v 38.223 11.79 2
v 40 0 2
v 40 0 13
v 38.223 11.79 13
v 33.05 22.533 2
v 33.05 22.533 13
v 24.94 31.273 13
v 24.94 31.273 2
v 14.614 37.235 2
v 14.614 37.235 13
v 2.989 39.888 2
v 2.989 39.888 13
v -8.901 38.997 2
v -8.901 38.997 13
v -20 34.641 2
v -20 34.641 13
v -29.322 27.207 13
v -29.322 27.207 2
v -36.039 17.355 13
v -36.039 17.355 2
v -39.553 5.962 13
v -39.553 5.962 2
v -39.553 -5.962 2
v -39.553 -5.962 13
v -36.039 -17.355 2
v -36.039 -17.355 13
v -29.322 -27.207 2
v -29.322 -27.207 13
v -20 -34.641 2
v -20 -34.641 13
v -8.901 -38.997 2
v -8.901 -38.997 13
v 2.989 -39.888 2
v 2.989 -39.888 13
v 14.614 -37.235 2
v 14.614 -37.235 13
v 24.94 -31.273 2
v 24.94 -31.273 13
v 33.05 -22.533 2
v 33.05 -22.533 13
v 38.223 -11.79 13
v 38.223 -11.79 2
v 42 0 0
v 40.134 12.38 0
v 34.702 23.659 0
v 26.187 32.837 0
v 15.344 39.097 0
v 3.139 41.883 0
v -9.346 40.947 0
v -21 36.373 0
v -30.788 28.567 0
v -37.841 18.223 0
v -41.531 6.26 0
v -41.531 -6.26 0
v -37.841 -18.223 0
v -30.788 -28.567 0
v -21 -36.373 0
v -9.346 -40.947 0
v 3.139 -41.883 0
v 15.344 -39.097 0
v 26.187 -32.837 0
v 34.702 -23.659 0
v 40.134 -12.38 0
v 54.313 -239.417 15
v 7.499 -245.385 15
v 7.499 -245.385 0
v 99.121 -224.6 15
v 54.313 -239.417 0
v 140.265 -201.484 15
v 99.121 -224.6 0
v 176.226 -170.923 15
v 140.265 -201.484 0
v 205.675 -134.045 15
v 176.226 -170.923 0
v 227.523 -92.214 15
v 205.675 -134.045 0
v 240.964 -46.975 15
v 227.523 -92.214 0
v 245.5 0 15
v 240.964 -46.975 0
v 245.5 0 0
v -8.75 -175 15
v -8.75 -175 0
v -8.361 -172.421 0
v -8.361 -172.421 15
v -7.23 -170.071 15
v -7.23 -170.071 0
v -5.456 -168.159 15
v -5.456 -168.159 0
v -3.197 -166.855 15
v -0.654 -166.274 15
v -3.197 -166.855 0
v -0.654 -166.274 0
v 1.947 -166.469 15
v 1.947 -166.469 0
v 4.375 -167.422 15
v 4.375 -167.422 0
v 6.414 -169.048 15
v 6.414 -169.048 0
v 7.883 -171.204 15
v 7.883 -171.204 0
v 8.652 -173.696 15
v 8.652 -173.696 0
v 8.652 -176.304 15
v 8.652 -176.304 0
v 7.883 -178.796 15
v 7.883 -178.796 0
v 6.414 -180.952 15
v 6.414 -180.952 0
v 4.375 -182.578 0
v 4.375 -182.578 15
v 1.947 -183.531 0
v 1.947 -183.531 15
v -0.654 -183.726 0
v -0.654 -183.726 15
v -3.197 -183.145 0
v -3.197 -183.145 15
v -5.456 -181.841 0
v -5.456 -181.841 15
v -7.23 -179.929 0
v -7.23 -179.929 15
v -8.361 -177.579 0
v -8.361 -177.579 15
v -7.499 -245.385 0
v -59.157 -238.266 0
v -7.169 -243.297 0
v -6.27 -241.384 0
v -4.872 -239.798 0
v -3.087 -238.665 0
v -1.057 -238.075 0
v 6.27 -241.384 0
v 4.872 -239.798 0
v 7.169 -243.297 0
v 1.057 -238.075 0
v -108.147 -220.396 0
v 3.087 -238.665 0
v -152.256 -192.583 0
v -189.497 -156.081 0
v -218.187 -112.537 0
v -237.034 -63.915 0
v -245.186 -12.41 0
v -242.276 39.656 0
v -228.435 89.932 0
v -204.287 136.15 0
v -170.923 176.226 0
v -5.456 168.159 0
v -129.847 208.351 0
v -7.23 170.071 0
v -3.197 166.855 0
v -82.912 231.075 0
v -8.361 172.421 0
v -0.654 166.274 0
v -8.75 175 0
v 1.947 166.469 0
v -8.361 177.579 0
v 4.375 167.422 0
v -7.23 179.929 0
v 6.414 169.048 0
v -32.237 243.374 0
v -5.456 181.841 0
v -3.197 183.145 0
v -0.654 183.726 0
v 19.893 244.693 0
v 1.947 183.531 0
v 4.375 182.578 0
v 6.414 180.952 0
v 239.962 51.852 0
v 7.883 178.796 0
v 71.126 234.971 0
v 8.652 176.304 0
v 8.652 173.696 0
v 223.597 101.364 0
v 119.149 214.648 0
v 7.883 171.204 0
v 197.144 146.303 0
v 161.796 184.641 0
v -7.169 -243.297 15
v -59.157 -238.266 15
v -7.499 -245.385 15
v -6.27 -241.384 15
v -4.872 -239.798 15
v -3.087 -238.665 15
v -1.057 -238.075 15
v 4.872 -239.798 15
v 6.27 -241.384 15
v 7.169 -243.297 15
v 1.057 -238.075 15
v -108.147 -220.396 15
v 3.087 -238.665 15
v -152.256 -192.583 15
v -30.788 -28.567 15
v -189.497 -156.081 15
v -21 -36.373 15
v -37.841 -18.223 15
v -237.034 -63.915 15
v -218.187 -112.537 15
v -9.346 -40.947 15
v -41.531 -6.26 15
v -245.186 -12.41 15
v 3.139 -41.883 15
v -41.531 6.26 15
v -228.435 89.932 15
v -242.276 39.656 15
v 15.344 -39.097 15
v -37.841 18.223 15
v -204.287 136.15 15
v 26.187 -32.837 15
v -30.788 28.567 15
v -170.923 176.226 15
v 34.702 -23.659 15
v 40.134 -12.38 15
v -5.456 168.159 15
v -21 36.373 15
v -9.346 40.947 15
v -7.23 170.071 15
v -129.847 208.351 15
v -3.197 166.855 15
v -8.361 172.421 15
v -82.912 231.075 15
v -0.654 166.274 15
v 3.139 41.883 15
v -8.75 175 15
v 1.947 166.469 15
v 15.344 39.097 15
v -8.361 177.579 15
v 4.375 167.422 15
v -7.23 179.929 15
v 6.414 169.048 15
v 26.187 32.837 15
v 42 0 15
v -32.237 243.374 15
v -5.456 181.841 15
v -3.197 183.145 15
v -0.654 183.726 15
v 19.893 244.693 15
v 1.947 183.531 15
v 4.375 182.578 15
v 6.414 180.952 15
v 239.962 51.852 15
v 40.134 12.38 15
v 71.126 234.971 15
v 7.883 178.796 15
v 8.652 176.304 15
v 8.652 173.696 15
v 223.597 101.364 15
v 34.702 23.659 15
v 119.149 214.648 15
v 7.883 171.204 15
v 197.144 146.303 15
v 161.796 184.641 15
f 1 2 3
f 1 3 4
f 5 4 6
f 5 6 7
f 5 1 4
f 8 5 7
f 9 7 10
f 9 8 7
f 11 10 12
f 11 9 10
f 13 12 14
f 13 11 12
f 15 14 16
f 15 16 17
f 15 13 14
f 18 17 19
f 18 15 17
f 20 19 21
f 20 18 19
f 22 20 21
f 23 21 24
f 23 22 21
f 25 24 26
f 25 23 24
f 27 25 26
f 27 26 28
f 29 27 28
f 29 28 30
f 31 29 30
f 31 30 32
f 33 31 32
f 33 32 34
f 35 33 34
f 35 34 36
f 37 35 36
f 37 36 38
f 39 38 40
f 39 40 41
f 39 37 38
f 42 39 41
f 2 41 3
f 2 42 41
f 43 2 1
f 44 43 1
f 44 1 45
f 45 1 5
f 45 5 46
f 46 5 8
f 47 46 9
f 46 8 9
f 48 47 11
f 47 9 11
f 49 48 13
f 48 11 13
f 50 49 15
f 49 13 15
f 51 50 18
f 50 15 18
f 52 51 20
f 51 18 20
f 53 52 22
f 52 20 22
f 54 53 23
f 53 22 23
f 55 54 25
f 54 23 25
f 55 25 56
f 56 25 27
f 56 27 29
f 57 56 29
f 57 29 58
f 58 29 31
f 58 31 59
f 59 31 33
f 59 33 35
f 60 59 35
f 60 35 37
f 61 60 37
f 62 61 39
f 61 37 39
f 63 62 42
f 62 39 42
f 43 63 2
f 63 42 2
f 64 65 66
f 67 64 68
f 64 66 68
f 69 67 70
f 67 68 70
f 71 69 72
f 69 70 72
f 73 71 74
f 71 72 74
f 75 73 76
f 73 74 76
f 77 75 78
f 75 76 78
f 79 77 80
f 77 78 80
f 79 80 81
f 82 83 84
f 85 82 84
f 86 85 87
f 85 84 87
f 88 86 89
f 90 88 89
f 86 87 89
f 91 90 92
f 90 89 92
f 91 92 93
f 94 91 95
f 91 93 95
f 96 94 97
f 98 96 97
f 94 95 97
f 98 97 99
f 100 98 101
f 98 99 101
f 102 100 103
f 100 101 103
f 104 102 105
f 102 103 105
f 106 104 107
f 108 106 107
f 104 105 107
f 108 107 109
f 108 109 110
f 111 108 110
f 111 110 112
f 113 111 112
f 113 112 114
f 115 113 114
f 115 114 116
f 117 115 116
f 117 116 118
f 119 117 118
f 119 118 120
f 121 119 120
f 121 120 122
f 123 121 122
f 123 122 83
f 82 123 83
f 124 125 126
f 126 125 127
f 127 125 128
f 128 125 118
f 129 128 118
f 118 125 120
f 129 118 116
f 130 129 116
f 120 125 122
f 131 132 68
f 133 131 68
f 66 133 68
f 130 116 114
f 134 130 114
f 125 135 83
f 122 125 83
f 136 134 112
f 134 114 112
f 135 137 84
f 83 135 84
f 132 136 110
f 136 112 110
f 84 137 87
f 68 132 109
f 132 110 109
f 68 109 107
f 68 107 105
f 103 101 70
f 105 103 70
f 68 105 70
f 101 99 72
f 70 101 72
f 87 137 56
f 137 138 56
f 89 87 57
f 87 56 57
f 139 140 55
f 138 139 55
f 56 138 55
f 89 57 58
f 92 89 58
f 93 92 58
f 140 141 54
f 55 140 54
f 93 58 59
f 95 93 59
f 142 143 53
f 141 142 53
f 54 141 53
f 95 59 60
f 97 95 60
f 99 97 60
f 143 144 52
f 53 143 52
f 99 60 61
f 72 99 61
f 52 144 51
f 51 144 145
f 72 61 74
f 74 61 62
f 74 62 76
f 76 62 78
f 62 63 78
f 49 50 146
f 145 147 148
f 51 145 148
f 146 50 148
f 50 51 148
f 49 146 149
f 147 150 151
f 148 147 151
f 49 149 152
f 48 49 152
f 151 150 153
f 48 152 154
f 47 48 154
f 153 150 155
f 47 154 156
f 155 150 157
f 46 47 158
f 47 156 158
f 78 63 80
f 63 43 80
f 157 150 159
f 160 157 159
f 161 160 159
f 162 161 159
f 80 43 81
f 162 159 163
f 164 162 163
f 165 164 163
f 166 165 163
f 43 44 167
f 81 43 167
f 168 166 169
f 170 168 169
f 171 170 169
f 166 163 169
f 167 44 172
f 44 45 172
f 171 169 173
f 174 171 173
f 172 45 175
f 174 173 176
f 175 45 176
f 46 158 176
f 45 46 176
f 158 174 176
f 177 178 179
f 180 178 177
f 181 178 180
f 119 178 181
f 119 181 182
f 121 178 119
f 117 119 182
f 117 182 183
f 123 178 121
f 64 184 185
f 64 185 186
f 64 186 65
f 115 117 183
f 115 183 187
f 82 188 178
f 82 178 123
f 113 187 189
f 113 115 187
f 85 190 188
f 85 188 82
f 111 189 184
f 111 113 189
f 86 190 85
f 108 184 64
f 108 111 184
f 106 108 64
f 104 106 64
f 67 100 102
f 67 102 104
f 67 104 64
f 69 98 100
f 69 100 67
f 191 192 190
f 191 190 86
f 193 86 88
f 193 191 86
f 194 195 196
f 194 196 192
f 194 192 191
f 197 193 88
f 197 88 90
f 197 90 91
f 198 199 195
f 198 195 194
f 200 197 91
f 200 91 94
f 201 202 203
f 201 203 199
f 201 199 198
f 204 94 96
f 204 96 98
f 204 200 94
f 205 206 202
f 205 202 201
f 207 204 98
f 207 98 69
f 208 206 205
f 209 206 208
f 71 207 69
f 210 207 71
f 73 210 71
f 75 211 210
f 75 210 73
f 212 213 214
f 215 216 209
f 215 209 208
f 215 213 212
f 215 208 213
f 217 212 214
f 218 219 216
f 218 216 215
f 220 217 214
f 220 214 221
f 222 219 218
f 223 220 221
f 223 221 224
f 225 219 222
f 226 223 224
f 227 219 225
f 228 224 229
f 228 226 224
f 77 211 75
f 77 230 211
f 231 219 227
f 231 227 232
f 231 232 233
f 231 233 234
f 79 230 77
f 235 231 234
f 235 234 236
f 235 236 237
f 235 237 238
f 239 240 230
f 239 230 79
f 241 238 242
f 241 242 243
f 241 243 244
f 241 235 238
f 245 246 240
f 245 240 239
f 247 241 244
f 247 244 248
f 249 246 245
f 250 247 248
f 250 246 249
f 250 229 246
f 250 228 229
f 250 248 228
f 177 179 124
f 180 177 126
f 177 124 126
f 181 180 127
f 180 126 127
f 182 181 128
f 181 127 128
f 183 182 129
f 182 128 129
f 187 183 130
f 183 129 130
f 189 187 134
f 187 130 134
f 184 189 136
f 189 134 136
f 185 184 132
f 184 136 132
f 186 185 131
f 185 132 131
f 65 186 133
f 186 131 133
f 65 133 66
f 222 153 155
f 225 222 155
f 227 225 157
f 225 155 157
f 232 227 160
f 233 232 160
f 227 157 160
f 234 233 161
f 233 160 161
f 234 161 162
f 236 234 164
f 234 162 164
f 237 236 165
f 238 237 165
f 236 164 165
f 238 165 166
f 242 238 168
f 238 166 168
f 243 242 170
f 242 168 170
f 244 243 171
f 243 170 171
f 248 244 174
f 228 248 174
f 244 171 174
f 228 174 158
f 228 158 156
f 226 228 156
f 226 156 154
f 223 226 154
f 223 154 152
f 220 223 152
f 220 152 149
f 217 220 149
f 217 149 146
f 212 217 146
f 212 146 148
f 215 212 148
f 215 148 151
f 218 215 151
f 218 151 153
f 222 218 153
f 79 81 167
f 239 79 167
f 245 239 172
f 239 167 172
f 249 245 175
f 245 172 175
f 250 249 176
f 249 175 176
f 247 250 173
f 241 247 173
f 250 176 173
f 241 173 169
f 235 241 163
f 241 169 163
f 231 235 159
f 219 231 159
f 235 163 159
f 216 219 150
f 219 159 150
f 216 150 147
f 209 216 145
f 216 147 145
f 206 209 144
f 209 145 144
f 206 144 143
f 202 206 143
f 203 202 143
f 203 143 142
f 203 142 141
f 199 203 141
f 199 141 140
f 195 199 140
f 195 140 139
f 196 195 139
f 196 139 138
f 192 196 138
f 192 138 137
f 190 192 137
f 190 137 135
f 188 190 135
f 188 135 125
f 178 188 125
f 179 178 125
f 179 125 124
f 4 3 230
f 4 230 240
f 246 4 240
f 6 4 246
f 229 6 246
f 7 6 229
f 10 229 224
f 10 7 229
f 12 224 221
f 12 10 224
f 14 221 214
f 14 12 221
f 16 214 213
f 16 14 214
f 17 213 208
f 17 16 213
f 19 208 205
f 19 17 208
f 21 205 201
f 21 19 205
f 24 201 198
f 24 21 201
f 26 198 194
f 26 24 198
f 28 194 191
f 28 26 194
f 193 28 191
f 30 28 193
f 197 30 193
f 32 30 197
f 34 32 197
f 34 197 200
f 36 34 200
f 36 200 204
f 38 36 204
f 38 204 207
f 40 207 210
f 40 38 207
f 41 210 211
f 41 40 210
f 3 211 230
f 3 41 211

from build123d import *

# Parameters (mm, degrees)
ESQUISSE1_R             = 245.5
ESQUISSE1_R_2           = 40
BOSS_EXTRU_1_DEPTH      = 15
D_GAGEMENT_M20_D        = 17.5
D_GAGEMENT_M20_DEPTH    = 15
CHANFREIN1_SIZE         = 2
ENL_V_MAT_EXTRU_1_REACH = 17
ESQUISSE4_R             = 7.5


with BuildPart() as part:
    # Esquisse1 → Boss.-Extru.1 (new body)
    with BuildSketch(Plane.XY):
        Circle(ESQUISSE1_R)
        Circle(ESQUISSE1_R_2, mode=Mode.SUBTRACT)
    extrude(amount=BOSS_EXTRU_1_DEPTH)

    # Dégagement M20
    with Locations(Plane.XY.offset(15)):
        with Locations((0, 175), (0, -175)):
            Hole(D_GAGEMENT_M20_D / 2, depth=D_GAGEMENT_M20_DEPTH)

    # Chanfrein1
    chanfrein1_edges = [part.edges().sort_by_distance(p)[0] for p in [
        (-40, 0, 0),
        (-40, 0, 15),
    ]]
    chamfer(chanfrein1_edges, length=CHANFREIN1_SIZE)

    # Esquisse4 → Enlèv. mat.-Extru.1 (cut, up to next)
    with BuildSketch(Plane(origin=(0, 0, 0), x_dir=(-1, 0, 0), z_dir=(0, 0, -1)), mode=Mode.PRIVATE) as enl_v_mat_extru_1_sk1:
        with Locations((0, -245.5)):
            Circle(ESQUISSE4_R)
    enl_v_mat_extru_1_tool1 = extrude(enl_v_mat_extru_1_sk1.sketch, amount=-ENL_V_MAT_EXTRU_1_REACH, mode=Mode.PRIVATE) & part.part
    add(enl_v_mat_extru_1_tool1.solids().sort_by_distance((0, -245.5, 0))[0], mode=Mode.SUBTRACT)


solid = part.part
